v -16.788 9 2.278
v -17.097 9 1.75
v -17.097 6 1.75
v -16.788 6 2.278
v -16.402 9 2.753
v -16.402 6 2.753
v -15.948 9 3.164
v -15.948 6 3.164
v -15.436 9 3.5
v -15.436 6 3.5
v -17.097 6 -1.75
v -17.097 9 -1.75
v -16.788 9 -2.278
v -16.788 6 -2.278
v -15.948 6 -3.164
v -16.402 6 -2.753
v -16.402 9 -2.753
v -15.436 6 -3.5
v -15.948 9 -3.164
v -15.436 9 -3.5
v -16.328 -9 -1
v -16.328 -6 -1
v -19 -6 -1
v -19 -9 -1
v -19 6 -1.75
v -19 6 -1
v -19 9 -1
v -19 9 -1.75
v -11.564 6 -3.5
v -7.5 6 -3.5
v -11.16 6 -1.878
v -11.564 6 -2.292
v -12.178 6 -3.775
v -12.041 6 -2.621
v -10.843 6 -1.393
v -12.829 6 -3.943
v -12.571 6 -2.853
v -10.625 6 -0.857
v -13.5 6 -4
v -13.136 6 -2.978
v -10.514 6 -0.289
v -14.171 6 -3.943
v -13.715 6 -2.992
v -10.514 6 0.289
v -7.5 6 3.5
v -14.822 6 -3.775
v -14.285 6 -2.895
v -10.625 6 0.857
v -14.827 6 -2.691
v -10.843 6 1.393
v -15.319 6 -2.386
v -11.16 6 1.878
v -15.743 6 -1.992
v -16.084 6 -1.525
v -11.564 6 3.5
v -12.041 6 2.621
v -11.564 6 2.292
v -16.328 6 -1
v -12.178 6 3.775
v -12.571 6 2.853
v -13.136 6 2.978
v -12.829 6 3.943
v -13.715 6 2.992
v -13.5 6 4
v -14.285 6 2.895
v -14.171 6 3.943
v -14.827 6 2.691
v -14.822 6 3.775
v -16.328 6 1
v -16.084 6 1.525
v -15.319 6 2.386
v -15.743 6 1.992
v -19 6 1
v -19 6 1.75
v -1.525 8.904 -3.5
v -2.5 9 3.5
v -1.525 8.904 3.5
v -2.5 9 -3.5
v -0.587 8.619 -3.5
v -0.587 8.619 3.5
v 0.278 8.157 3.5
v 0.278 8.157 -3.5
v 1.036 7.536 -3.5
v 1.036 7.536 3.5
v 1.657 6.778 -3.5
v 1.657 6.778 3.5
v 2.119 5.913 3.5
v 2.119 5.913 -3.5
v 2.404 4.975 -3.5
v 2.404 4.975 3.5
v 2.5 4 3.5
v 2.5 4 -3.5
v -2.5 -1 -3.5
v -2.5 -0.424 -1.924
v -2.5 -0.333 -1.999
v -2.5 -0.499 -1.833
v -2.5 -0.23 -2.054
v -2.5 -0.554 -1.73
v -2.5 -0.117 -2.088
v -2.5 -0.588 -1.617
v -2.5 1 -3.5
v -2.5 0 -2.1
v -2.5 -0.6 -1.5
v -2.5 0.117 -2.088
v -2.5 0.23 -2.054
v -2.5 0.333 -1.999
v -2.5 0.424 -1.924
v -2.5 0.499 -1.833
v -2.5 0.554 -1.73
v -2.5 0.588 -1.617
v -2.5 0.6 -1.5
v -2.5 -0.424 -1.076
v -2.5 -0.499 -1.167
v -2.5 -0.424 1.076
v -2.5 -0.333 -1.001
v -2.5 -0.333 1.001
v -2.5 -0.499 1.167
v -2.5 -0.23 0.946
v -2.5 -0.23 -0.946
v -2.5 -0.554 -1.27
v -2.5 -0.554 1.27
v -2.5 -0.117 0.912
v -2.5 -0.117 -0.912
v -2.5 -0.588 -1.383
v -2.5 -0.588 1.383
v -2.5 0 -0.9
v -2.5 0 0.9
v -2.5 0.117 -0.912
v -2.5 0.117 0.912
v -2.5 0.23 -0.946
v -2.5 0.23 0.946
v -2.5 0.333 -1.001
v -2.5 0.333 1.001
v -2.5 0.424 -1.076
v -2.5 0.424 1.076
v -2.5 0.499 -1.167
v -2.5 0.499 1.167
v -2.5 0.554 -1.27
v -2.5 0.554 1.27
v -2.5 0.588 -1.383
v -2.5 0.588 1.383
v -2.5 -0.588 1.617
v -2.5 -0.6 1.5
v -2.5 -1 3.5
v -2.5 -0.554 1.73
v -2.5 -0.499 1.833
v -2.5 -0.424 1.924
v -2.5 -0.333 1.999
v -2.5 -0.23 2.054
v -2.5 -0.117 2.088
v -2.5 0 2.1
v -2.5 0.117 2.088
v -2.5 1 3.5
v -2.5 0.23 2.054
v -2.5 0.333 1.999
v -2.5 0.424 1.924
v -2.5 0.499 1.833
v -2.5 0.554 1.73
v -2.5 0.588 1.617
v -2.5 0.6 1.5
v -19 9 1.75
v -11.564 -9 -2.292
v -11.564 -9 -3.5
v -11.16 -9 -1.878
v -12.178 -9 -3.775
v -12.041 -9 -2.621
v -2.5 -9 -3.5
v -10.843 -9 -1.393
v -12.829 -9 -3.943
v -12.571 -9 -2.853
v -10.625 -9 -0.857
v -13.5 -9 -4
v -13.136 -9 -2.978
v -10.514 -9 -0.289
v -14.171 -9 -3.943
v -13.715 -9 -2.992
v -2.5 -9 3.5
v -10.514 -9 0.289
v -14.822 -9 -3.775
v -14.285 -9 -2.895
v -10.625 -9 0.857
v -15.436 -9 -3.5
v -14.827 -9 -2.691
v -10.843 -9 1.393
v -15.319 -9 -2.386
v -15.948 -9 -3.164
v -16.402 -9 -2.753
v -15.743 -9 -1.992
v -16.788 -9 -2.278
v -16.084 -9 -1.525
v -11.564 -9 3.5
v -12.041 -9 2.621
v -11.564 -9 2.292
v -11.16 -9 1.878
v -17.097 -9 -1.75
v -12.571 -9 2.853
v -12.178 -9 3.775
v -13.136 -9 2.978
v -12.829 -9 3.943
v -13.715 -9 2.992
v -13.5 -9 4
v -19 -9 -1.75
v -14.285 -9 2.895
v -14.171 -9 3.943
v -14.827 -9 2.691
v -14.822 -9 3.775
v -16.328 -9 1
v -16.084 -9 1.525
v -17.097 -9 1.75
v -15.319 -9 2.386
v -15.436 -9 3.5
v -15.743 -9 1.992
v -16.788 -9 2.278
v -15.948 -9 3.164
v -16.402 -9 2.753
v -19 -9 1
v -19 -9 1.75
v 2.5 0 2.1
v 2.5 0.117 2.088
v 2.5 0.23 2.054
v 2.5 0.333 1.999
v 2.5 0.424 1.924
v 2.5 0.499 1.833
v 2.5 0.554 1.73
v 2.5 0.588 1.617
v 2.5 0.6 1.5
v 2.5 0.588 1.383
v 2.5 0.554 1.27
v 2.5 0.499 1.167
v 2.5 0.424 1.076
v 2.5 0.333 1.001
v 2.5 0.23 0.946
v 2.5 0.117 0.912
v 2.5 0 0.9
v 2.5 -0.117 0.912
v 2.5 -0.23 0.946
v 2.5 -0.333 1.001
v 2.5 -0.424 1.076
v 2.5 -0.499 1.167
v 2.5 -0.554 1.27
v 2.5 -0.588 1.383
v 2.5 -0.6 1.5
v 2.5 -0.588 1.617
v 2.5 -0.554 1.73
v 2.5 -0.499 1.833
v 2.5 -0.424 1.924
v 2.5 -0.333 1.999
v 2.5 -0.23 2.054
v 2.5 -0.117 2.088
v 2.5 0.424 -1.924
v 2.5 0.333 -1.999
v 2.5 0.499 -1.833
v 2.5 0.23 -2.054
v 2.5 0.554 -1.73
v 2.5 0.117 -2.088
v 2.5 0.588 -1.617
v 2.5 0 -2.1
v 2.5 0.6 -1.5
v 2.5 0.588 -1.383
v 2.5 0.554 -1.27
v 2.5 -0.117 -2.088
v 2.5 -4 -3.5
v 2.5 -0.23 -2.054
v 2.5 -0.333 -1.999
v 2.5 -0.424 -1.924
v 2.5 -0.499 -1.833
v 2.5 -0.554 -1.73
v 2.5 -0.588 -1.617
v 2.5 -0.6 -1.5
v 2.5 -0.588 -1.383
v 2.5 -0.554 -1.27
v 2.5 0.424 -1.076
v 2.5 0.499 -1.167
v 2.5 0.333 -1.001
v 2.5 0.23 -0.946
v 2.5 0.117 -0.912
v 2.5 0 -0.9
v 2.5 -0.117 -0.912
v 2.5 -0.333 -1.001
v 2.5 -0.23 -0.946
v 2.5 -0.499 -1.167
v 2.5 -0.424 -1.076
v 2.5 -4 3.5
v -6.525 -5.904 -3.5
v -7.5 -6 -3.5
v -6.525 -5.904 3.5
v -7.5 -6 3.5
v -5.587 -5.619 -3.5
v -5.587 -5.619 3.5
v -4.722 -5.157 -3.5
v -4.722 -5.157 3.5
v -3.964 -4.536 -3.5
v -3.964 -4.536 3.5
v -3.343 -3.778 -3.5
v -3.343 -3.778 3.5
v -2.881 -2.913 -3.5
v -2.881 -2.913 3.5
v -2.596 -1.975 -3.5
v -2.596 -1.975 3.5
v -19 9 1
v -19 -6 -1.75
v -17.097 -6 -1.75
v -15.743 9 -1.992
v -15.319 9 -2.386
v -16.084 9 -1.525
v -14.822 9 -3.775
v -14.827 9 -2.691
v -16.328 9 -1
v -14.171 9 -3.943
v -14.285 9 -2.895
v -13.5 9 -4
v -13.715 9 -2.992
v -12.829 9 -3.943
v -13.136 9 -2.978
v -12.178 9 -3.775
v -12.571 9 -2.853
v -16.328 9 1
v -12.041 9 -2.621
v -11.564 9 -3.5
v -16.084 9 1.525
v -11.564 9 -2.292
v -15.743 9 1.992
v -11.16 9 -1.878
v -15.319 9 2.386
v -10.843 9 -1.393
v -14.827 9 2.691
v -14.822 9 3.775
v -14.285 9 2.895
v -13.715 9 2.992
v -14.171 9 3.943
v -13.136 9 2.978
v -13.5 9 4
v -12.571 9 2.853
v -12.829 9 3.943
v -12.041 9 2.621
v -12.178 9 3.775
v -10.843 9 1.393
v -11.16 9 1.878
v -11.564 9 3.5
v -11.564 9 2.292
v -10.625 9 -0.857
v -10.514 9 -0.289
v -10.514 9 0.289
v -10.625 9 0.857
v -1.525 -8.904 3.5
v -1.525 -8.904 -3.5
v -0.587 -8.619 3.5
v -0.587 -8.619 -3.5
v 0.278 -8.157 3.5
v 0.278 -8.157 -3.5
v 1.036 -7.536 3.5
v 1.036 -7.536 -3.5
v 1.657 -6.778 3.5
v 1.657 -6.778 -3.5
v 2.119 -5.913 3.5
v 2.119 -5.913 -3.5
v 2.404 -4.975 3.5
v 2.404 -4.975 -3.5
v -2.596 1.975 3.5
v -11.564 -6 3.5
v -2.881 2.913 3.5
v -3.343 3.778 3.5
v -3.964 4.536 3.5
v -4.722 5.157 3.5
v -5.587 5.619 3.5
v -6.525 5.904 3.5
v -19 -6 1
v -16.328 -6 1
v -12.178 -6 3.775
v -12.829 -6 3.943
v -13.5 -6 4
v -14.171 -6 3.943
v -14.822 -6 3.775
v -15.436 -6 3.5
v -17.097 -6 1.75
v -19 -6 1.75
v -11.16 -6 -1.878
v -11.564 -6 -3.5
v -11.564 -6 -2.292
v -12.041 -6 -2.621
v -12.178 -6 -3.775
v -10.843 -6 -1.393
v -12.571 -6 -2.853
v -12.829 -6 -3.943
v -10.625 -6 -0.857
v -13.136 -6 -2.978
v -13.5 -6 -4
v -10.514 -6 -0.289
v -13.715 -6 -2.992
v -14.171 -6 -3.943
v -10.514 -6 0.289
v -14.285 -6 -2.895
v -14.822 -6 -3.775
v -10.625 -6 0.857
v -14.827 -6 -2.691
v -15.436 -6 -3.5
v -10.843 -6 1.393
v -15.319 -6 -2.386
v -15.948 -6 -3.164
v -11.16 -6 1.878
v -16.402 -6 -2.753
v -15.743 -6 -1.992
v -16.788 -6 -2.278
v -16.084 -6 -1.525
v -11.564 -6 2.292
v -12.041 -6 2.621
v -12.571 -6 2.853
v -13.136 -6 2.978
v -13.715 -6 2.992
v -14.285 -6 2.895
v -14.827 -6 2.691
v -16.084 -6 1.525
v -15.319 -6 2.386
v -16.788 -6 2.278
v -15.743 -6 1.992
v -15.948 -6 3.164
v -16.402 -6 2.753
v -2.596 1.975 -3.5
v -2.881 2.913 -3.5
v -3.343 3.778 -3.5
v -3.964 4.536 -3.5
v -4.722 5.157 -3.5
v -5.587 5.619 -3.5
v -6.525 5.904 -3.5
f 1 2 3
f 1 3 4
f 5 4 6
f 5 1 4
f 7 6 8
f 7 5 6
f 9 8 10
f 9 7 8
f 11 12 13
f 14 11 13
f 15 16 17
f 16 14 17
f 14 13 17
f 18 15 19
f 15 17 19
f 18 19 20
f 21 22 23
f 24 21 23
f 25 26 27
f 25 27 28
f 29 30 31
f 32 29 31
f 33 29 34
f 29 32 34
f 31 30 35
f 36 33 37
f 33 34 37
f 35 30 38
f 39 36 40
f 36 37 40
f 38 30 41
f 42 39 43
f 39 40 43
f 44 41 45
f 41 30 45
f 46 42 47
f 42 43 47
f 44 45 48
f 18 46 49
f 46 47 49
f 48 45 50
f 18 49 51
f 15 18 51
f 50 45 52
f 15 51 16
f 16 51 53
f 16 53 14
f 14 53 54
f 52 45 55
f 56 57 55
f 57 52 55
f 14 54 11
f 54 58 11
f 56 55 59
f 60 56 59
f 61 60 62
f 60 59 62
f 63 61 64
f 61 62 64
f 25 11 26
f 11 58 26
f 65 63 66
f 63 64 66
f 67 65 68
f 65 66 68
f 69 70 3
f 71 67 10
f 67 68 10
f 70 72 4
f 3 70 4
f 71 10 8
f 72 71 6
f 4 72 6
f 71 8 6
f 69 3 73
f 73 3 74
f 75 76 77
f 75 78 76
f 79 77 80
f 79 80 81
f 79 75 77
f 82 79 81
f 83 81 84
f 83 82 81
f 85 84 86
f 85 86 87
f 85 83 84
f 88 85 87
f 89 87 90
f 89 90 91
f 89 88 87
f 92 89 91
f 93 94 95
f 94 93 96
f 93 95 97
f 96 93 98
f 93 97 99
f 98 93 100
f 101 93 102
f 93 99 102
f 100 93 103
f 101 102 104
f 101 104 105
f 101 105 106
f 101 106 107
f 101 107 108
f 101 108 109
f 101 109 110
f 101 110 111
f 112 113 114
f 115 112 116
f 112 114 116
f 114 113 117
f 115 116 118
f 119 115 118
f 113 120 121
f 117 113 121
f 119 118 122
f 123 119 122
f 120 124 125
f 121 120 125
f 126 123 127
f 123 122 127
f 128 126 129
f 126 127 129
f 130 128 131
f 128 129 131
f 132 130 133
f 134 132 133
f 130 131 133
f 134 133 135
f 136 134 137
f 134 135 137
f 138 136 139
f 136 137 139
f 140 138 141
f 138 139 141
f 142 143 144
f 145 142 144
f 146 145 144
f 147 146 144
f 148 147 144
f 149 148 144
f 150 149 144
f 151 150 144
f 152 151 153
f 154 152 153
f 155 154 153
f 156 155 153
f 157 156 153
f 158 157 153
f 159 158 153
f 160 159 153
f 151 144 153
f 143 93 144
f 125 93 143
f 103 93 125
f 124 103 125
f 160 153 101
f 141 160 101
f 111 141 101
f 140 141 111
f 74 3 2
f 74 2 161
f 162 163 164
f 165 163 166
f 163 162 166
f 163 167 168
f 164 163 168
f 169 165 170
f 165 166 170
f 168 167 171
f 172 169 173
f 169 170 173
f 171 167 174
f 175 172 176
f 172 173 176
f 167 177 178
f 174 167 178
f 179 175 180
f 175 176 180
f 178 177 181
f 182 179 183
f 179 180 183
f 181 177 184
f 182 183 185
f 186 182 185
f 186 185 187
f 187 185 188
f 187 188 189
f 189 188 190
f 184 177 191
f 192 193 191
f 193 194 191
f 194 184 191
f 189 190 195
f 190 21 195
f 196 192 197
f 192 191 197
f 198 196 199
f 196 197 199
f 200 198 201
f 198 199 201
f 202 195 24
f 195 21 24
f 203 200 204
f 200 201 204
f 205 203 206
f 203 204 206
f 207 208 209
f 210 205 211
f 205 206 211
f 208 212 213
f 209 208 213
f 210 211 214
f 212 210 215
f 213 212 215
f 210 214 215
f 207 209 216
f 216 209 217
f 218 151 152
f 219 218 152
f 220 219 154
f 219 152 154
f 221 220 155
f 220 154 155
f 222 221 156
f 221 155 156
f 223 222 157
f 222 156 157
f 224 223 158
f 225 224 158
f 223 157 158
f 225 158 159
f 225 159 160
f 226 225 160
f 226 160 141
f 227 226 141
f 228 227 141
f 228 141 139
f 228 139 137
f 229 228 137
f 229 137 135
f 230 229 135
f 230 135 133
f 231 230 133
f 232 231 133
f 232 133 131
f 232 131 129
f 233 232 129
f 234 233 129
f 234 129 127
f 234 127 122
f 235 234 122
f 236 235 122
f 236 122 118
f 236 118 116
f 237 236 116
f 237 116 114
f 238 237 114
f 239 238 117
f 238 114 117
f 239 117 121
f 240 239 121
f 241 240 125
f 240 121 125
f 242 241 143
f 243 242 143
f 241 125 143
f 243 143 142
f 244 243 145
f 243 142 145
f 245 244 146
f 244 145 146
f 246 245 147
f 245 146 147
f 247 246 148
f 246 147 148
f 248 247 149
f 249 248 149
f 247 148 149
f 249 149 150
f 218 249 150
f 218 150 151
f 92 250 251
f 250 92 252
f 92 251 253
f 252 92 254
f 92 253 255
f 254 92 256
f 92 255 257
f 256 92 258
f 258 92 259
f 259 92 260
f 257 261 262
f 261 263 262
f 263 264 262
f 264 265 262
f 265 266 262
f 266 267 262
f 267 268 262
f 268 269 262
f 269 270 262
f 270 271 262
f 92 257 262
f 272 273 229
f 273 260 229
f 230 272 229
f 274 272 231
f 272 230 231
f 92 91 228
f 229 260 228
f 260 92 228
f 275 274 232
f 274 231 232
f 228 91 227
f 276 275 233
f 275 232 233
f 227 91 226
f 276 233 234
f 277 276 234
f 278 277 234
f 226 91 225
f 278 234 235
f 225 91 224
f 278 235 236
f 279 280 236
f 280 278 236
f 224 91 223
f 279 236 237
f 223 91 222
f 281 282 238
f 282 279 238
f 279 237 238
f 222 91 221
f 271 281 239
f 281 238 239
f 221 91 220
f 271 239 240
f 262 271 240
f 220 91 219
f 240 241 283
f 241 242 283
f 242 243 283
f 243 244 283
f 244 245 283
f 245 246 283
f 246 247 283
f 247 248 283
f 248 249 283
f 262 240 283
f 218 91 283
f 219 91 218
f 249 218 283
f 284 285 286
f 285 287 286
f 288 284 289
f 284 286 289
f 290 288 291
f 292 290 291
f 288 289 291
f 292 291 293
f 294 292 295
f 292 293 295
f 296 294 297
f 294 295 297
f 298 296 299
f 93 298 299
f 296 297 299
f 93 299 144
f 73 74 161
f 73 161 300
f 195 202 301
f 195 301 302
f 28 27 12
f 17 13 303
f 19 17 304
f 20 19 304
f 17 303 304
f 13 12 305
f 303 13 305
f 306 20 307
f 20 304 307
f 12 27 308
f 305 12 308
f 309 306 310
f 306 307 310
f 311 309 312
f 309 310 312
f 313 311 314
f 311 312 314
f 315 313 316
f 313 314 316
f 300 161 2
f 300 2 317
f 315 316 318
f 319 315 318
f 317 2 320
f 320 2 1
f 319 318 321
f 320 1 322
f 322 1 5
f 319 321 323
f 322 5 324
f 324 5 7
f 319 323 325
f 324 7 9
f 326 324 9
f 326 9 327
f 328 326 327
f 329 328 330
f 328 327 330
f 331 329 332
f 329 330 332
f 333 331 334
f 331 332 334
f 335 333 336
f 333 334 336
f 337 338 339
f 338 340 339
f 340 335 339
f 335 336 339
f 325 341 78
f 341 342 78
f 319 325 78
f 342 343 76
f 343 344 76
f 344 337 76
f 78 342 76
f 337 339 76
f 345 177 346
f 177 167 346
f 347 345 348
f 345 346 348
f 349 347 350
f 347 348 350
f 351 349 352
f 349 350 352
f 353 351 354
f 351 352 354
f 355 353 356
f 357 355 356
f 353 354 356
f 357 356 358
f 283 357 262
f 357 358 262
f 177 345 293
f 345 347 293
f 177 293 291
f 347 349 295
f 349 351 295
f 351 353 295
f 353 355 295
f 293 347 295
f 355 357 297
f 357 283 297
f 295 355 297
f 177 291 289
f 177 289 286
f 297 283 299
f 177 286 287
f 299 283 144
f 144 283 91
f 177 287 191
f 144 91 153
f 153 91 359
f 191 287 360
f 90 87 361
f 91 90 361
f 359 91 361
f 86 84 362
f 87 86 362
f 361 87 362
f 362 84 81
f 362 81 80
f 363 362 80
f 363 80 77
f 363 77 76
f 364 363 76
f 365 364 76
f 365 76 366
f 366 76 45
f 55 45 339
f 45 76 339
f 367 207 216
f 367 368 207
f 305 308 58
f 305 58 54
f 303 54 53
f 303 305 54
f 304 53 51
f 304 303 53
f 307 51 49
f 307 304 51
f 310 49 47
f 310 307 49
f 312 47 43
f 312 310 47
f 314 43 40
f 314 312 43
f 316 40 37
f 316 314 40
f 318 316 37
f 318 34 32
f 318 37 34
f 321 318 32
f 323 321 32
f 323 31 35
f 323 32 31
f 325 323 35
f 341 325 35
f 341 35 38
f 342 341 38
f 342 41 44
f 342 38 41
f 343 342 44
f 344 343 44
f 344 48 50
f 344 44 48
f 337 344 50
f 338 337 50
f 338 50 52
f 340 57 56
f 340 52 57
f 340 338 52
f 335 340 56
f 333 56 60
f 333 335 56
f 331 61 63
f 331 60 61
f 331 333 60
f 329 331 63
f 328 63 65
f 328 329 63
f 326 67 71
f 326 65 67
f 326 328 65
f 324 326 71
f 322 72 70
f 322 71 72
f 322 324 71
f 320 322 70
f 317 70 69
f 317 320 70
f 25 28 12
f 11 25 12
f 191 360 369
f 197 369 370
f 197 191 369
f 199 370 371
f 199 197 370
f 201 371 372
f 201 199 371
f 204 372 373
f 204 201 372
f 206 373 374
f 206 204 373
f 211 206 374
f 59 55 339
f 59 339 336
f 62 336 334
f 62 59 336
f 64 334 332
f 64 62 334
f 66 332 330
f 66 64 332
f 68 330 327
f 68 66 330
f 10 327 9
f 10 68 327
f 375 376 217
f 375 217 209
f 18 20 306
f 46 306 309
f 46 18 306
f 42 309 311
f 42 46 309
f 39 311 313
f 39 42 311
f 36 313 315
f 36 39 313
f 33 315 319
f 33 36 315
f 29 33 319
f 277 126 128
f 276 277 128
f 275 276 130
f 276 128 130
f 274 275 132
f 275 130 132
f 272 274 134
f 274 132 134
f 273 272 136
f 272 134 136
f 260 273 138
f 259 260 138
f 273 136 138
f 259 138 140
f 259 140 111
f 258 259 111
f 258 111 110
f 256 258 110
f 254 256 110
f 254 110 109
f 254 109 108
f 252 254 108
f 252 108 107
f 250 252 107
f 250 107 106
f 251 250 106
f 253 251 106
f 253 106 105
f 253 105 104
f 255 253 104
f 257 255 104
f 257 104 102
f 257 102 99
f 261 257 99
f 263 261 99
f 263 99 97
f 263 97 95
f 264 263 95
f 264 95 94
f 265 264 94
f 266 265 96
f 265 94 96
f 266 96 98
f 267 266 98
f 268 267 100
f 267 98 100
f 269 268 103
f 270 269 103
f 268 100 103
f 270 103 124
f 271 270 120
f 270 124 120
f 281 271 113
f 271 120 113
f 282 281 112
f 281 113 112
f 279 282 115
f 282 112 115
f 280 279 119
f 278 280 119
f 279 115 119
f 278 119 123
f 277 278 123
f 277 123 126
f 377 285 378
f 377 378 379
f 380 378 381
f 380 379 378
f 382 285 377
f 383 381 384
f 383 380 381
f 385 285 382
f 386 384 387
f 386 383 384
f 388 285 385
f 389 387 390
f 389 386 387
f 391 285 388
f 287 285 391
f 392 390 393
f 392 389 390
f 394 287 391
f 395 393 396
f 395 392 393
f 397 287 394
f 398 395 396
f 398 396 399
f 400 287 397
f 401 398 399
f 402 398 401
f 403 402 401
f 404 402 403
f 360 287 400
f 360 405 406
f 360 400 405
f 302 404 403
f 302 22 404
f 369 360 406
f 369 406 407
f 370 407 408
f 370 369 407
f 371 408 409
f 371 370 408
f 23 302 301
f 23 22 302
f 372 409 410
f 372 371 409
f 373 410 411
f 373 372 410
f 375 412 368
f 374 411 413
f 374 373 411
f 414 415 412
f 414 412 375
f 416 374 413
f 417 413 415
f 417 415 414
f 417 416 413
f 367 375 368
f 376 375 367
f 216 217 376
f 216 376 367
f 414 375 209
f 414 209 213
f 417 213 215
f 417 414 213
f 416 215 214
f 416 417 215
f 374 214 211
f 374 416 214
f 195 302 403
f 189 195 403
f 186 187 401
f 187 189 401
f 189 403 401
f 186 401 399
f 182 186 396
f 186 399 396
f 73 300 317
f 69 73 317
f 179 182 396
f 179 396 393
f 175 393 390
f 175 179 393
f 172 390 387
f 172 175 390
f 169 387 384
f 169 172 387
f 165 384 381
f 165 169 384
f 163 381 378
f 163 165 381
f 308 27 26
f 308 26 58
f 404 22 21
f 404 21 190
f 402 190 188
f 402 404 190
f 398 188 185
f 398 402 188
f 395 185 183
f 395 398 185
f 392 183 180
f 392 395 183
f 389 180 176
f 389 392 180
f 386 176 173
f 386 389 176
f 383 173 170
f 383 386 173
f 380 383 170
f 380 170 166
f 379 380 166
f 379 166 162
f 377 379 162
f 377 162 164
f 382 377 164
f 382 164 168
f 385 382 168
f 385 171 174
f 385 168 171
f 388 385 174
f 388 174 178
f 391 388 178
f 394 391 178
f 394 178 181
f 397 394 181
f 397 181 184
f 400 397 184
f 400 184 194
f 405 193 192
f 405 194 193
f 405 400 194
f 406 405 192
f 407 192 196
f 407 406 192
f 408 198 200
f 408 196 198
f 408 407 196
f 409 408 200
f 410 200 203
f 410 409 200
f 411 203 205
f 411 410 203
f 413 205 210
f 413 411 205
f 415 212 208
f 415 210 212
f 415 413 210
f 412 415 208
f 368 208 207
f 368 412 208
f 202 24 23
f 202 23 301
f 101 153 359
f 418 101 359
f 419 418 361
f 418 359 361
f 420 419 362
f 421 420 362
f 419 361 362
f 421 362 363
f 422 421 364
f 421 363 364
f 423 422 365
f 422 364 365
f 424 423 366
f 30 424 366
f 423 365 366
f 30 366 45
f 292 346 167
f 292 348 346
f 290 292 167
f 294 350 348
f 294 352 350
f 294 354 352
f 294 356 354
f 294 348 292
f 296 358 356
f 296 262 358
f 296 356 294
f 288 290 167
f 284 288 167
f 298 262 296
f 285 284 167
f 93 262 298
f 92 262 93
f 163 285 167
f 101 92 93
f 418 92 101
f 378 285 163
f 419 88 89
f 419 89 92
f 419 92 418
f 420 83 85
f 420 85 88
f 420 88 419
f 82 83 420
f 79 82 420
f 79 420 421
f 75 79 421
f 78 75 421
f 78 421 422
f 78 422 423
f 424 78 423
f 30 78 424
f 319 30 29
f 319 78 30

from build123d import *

# Parameters (mm, degrees)
BOSS_EXTRUDE1_DEPTH     = 3.5
SKETCH2_R               = 0.6
CUT_EXTRUDE1_DEPTH      = 18.839562775
CUT_EXTRUDE2_DEPTH      = 26.347583711
BOSS_EXTRUDE3_START     = -18
SKETCH8_R               = 3
BOSS_EXTRUDE3_DEPTH     = 18
CUT_EXTRUDE6_DEPTH      = 23.321514286
CUT_EXTRUDE6_DEPTH_BACK = 23.321514286
SKETCH9_W               = 14.986497077
SKETCH9_H               = 12
CUT_EXTRUDE8_DEPTH      = 27.47640459
FILLET1_R               = 5


with BuildPart() as part:
    # Sketch1 → Boss-Extrude1 (new, symmetric)
    with BuildSketch(Plane.XY):
        with BuildLine():
            Line((-7.5, 6), (-17.5, 6))
            Line((-17.5, 6), (-17.5, 9))
            Line((-17.5, 9), (2.5, 9))
            Line((2.5, 9), (2.5, -9))
            Line((2.5, -9), (-4.576098932, -9))
            Line((-4.576098932, -9), (-17.5, -9))
            Line((-17.5, -9), (-17.5, -6))
            Line((-17.5, -6), (-7.5, -6))
            ThreePointArc((-7.5, -6), (-3.964466094, -4.535533906), (-2.5, -1))
            Line((-2.5, -1), (-2.5, 1))
            ThreePointArc((-2.5, 1), (-3.964466094, 4.535533906), (-7.5, 6))
        make_face()
    extrude(amount=BOSS_EXTRUDE1_DEPTH, both=True)

    # Sketch2 → Cut-Extrude1 (cut, through all)
    with BuildSketch(Plane.ZY.offset(2.5)):
        with Locations((1.5, 0)):
            Circle(SKETCH2_R)
        with Locations((-1.5, 0)):
            Circle(SKETCH2_R)
    extrude(amount=-CUT_EXTRUDE1_DEPTH, mode=Mode.SUBTRACT)

    # Sketch3 → Cut-Extrude2 (cut, through all)
    with BuildSketch(Plane(origin=(0, 9, 0), x_dir=(1, 0, 0), z_dir=(0, 1, 0))):
        with BuildLine():
            Line((-18.680784021, 1), (-16.328427125, 1))
            ThreePointArc((-16.328427125, 1), (-10.5, 0), (-16.328427125, -1))
            Line((-16.328427125, -1), (-18.680784021, -1))
            Line((-18.680784021, -1), (-18.680784021, 1))
        make_face()
    extrude(amount=-CUT_EXTRUDE2_DEPTH, mode=Mode.SUBTRACT)

    # Sketch8 → Boss-Extrude3 (add)
    with BuildSketch(Plane(origin=(0, 9, 0), x_dir=(1, 0, 0), z_dir=(0, 1, 0)).offset(BOSS_EXTRUDE3_START)):
        with BuildLine():
            Line((-17.372983346, 1), (-19, 1))
            Line((-19, 1), (-19, 1.75))
            Line((-19, 1.75), (-17.096873642, 1.75))
            ThreePointArc((-17.096873642, 1.75), (-9.5, 0), (-17.096873642, -1.75))
            Line((-17.096873642, -1.75), (-19, -1.75))
            Line((-19, -1.75), (-19, -1))
            Line((-19, -1), (-17.372983346, -1))
            ThreePointArc((-17.372983346, -1), (-17.5, 0), (-17.372983346, 1))
        make_face()
        with Locations(Location((-13.5, 0, 0), (0, 0, 180))):
            Circle(SKETCH8_R, mode=Mode.SUBTRACT)
    extrude(amount=BOSS_EXTRUDE3_DEPTH)

    # Sketch9 → Cut-Extrude6 (cut, two sides: drawn at the far end of the back side and taken through both)
    with BuildSketch(Plane(origin=(0, 0, -3.5), x_dir=(-1, 0, 0), z_dir=(0, 0, -1)).offset(-CUT_EXTRUDE6_DEPTH_BACK)):
        with Locations((14.993248539, 0)):
            Rectangle(SKETCH9_W, SKETCH9_H)
    extrude(amount=CUT_EXTRUDE6_DEPTH + CUT_EXTRUDE6_DEPTH_BACK, mode=Mode.SUBTRACT)

    # Sketch10 → Cut-Extrude8 (cut, through all)
    with BuildSketch(Plane(origin=(0, 9, 0), x_dir=(1, 0, 0), z_dir=(0, 1, 0))):
        with BuildLine():
            Line((-17.5, 1.75), (-17.096873642, 1.75))
            ThreePointArc((-17.096873642, 1.75), (-16.401750839, 2.753151298), (-15.436491673, 3.5))
            Line((-15.436491673, 3.5), (-17.5, 3.5))
            Line((-17.5, 3.5), (-17.5, 1.75))
        make_face()
        with BuildLine():
            Line((-17.5, -1.75), (-17.096873642, -1.75))
            ThreePointArc((-17.096873642, -1.75), (-16.401750839, -2.753151298), (-15.436491673, -3.5))
            Line((-15.436491673, -3.5), (-17.5, -3.5))
            Line((-17.5, -3.5), (-17.5, -1.75))
        make_face()
        with BuildLine():
            Line((-17.372983346, -1), (-16.328427125, -1))
            ThreePointArc((-16.328427125, -1), (-16.5, 0), (-16.328427125, 1))
            Line((-16.328427125, 1), (-17.372983346, 1))
            ThreePointArc((-17.372983346, 1), (-17.5, 0), (-17.372983346, -1))
        make_face()
    extrude(amount=-CUT_EXTRUDE8_DEPTH, mode=Mode.SUBTRACT)

    # Fillet1
    fillet1_edges = [part.edges().sort_by_distance(p)[0] for p in [
        (2.5, 9, 0),
        (2.5, -9, 0),
    ]]
    fillet(fillet1_edges, radius=FILLET1_R)


solid = part.part
